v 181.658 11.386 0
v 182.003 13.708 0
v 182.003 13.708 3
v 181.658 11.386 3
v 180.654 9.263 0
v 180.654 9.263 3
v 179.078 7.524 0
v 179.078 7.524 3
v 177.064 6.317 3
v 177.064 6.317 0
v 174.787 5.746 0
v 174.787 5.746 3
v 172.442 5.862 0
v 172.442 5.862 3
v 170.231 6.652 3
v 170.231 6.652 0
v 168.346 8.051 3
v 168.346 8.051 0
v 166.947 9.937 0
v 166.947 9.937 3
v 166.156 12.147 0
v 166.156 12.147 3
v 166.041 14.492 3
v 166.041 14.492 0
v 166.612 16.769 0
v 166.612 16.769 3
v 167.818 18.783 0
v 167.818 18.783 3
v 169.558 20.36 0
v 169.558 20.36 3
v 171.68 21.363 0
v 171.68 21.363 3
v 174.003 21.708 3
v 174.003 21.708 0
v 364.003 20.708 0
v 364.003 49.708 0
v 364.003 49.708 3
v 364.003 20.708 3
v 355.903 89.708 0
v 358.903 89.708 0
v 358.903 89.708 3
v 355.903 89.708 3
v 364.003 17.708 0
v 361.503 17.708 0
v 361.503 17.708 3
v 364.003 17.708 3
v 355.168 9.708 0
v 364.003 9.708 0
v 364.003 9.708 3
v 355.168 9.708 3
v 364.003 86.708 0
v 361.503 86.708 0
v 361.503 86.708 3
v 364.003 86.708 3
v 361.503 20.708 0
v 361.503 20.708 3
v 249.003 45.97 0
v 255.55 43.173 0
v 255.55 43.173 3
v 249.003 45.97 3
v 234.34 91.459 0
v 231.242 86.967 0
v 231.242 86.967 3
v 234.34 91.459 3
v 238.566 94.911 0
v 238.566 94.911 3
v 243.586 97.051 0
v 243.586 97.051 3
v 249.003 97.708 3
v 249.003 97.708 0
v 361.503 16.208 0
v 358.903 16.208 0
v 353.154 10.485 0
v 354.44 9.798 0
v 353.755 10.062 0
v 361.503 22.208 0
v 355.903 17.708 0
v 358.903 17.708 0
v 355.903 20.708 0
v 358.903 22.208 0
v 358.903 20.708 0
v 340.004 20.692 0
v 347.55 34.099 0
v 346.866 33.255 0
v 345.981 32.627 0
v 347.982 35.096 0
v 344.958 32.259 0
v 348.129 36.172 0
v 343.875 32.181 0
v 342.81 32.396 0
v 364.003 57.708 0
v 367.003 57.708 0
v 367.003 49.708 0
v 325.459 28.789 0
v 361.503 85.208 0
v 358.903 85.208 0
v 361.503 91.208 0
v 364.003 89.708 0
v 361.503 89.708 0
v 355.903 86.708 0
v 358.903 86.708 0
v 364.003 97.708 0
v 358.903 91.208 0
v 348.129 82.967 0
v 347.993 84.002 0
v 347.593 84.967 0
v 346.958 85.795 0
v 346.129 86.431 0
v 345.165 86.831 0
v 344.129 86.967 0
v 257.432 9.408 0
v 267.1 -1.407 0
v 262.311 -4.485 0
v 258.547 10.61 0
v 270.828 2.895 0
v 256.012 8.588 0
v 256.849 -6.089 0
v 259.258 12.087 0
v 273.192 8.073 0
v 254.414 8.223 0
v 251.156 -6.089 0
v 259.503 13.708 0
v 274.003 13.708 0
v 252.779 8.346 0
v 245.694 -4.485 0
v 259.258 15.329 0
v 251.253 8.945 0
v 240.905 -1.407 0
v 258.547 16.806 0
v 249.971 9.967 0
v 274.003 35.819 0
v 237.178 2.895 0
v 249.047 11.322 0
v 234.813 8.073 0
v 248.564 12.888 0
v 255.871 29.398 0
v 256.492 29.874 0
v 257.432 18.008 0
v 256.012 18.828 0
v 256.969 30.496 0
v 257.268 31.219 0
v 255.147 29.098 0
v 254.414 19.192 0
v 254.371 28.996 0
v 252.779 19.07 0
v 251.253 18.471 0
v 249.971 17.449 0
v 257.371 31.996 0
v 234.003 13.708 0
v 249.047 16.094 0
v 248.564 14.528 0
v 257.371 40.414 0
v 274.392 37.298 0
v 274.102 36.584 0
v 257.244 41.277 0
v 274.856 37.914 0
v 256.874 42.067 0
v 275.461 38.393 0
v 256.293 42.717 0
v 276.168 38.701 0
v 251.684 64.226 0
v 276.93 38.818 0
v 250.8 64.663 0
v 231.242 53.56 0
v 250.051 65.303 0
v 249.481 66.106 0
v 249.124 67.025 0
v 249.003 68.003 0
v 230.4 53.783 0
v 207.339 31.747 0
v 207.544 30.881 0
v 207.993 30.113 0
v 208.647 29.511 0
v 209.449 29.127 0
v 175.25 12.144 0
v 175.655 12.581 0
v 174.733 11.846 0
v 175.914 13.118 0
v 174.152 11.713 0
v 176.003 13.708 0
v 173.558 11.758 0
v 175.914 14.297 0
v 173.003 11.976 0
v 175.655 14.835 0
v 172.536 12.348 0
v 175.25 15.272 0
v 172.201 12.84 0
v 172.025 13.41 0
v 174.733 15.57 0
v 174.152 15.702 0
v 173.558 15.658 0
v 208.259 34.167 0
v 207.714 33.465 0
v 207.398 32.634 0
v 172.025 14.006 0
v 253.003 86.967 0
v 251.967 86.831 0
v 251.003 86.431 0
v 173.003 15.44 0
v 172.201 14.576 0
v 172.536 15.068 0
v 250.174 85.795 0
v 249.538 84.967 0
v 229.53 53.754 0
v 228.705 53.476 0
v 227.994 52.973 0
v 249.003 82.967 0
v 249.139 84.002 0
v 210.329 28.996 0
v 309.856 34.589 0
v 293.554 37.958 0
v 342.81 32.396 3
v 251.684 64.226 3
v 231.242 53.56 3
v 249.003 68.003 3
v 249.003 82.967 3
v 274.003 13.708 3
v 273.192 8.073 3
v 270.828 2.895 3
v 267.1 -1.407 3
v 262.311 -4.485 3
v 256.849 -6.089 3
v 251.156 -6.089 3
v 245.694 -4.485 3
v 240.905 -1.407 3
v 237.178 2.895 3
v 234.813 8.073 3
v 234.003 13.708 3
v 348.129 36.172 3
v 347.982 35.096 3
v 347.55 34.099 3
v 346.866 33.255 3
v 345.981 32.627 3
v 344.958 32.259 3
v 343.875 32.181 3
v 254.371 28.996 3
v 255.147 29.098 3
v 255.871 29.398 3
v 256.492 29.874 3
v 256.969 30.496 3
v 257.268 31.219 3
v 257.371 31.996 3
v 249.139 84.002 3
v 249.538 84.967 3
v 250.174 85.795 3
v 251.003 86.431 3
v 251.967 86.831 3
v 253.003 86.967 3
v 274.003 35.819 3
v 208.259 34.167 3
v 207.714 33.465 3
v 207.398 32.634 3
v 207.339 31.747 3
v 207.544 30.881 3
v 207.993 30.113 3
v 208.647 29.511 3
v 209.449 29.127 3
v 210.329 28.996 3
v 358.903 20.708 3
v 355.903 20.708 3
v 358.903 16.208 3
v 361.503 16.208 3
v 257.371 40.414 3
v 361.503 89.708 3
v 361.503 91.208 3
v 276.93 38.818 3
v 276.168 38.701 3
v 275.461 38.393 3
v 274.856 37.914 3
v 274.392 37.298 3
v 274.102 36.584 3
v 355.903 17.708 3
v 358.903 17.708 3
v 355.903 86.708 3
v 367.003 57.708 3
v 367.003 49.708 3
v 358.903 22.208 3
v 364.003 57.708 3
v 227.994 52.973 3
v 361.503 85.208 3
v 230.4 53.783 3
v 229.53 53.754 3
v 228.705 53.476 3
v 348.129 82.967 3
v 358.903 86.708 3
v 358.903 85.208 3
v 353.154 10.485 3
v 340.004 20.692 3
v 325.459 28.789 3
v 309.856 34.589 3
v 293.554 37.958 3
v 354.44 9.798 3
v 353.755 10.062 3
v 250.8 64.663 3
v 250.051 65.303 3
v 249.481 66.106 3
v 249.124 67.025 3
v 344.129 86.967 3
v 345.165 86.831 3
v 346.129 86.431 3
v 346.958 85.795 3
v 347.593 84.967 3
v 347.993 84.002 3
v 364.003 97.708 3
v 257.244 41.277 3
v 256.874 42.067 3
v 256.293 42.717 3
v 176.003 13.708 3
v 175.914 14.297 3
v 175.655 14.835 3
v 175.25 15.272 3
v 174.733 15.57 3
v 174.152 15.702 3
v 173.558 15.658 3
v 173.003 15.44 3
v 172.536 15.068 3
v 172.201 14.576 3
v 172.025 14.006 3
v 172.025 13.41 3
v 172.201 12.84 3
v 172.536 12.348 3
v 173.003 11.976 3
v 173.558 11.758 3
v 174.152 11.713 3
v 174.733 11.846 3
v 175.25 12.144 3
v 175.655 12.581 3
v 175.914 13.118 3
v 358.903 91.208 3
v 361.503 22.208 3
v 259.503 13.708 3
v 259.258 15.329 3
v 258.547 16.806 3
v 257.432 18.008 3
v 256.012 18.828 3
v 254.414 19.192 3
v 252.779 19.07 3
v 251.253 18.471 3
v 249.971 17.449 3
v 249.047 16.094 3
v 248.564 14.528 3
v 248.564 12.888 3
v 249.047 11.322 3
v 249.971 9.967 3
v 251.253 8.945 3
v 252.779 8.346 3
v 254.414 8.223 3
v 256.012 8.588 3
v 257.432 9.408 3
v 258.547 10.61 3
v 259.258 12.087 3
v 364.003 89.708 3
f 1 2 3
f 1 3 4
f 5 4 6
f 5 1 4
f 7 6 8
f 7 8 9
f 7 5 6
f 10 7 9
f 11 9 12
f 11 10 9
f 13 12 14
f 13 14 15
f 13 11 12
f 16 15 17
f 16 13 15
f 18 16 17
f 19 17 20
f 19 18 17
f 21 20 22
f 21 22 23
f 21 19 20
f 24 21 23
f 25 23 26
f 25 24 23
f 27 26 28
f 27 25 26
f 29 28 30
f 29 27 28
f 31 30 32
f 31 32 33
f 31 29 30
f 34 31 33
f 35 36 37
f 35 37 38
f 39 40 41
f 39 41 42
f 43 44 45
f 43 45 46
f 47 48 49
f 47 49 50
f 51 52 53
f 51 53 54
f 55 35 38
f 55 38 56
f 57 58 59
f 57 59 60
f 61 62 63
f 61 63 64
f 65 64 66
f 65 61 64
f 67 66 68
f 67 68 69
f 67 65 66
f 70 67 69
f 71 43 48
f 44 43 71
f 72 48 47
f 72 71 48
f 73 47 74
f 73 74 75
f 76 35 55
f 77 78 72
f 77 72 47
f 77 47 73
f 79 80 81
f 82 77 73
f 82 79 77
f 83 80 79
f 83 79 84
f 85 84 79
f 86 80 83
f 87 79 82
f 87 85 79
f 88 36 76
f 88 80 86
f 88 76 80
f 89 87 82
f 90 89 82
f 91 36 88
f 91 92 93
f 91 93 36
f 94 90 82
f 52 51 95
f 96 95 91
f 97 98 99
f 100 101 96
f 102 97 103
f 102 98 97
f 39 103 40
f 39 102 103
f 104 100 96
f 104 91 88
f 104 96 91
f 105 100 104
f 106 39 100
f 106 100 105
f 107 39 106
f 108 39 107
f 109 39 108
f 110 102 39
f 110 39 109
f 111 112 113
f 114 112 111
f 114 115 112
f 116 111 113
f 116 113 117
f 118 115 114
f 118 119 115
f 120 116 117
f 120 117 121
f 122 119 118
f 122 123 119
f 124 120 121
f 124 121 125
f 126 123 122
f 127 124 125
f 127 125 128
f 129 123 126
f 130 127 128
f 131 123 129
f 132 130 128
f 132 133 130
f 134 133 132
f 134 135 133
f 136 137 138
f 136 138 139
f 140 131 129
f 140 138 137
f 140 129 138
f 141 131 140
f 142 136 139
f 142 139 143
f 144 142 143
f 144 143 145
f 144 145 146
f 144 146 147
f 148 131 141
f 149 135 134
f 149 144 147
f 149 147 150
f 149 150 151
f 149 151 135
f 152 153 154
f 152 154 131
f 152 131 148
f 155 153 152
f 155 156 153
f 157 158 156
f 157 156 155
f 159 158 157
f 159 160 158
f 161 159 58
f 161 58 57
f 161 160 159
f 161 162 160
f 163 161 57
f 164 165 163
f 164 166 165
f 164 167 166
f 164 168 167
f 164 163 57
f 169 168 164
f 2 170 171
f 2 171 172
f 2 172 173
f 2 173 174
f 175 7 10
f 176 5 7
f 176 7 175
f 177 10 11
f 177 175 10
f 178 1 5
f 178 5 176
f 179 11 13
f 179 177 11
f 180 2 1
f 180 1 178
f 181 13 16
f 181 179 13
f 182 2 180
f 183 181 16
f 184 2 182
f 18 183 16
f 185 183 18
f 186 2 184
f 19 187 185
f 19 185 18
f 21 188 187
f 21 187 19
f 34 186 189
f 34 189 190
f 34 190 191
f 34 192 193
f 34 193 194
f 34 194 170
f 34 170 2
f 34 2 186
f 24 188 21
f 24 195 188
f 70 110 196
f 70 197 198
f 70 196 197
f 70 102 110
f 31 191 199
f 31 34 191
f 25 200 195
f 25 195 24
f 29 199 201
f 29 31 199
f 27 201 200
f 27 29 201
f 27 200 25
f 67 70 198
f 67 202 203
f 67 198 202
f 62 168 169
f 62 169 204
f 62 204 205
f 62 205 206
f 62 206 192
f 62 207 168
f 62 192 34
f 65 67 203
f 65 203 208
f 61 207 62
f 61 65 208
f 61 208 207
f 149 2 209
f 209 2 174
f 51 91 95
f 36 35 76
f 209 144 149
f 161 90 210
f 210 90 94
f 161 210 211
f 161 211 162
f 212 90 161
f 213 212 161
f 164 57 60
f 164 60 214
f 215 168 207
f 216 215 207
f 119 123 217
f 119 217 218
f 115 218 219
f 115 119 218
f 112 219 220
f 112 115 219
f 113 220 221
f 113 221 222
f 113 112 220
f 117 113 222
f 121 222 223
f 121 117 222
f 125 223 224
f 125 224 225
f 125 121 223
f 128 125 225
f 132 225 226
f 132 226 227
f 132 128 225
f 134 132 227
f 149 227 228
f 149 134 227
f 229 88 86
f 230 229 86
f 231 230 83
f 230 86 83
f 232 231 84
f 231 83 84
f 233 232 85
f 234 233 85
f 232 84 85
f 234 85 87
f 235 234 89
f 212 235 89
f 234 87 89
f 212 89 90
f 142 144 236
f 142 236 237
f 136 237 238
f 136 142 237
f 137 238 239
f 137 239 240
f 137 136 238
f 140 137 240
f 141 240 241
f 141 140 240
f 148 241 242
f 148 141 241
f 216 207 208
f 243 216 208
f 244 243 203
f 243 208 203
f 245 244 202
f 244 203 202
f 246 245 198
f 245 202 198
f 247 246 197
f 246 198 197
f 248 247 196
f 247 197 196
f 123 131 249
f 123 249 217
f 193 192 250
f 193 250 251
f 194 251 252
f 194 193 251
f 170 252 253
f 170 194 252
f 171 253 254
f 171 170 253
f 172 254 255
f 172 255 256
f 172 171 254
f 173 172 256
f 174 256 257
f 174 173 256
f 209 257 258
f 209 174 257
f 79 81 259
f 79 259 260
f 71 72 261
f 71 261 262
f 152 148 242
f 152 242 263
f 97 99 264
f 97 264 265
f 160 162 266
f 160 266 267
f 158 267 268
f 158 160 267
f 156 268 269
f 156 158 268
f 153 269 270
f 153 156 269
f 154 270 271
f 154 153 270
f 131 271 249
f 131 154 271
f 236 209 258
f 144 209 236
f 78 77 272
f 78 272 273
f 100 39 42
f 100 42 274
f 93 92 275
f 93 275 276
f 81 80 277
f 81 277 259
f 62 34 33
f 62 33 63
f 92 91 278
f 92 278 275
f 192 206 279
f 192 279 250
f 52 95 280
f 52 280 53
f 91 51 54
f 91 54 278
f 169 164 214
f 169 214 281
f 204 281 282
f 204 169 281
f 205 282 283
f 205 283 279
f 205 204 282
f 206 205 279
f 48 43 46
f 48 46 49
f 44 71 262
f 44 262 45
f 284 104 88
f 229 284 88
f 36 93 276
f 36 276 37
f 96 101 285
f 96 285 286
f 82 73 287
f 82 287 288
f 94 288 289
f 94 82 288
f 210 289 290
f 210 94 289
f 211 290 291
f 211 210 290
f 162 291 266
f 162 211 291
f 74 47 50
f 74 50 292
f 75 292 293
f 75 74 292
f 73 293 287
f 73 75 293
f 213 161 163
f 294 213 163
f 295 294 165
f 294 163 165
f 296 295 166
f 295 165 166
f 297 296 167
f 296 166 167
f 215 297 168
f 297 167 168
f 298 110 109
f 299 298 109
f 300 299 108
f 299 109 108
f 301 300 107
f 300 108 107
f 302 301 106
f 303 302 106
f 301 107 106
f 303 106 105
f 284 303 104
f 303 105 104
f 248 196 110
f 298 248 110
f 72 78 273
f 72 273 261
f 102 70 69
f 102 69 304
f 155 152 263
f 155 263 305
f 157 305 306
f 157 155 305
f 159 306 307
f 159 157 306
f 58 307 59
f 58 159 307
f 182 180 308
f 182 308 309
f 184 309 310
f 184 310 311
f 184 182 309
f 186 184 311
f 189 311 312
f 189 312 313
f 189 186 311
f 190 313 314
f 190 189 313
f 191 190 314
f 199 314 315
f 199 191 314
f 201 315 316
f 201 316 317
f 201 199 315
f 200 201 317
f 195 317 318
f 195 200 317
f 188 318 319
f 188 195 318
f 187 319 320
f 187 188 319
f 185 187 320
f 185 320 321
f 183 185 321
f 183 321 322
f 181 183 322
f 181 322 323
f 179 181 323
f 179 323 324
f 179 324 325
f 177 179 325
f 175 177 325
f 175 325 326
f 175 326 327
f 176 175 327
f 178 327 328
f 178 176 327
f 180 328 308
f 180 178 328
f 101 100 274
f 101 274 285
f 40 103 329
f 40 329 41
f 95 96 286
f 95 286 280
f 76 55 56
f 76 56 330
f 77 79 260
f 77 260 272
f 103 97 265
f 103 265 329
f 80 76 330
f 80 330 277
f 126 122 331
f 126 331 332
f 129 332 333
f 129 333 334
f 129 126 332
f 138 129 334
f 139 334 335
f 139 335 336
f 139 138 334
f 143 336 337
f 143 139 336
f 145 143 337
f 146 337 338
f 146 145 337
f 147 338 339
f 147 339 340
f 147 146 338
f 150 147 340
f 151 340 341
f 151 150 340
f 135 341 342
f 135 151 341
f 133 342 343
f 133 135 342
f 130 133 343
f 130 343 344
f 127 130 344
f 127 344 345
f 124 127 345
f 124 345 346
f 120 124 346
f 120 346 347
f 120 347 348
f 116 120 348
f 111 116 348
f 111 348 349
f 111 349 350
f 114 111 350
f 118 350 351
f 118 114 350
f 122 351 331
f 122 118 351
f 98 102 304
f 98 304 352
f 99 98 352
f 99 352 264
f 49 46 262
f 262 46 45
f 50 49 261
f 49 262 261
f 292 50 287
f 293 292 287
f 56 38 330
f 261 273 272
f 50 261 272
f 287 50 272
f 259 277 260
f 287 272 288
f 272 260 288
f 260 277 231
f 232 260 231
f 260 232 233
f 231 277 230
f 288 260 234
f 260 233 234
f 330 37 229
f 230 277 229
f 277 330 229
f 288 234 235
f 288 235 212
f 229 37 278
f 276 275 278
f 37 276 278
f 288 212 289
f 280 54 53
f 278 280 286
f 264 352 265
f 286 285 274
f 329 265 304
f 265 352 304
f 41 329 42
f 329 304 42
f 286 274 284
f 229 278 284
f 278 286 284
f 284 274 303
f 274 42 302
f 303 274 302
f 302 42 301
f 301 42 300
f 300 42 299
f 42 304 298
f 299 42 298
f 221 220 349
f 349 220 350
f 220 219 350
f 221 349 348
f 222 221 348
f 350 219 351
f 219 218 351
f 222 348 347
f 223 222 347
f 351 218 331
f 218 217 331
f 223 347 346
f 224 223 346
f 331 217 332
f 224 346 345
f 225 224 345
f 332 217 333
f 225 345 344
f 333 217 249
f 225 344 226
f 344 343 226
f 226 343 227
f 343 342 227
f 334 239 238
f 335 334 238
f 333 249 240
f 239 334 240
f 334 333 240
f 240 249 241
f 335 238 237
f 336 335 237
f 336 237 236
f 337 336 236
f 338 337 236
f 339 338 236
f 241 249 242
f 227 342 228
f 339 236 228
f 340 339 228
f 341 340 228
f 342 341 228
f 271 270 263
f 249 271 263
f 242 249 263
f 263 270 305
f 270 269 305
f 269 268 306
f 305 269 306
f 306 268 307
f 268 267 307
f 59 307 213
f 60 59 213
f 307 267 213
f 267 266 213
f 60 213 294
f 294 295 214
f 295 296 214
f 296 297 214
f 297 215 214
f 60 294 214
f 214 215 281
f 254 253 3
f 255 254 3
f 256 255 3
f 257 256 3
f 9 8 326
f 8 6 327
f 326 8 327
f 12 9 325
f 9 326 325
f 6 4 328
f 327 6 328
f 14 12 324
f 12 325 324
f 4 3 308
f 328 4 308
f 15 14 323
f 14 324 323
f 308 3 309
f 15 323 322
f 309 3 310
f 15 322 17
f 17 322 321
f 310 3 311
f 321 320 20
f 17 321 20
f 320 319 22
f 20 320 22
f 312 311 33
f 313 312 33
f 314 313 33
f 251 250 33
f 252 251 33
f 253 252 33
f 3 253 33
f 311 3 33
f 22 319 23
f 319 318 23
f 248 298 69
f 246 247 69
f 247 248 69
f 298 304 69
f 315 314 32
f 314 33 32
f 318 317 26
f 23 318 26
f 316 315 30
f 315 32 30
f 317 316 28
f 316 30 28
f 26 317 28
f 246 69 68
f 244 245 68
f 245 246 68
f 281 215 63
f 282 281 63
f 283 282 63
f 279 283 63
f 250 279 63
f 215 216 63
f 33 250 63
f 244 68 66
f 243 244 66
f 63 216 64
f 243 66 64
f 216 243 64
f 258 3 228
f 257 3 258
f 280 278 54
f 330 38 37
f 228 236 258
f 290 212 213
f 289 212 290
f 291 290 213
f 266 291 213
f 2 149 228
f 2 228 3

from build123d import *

# Parameters (mm, degrees)
SKETCH_1_R      = 2
SKETCH_1_R_2    = 5.5
EXTRUDE_1_DEPTH = 3


with BuildPart() as part:
    # 草图1 → 凸台-拉伸1 (new body)
    with BuildSketch(Plane.XY):
        with BuildLine():
            Line((234.002581869, 13.707860978), (182.002581869, 13.707860978))
            ThreePointArc((182.002581869, 13.707860978), (168.34572762, 8.051006728), (174.002581869, 21.707860978))
            Line((174.002581869, 21.707860978), (231.242343182, 86.967009497))
            ThreePointArc((231.242343182, 86.967009497), (238.565892024, 94.911259453), (249.002581869, 97.707860978))
            Line((249.002581869, 97.707860978), (354.002581869, 97.707860978))
            Line((354.002581869, 97.707860978), (364.002581869, 97.707860978))
            Line((364.002581869, 97.707860978), (364.002581869, 89.707860978))
            Line((364.002581869, 89.707860978), (361.502581869, 89.707860978))
            Line((361.502581869, 89.707860978), (361.502581869, 91.207860978))
            Line((361.502581869, 91.207860978), (358.902581869, 91.207860978))
            Line((358.902581869, 91.207860978), (358.902581869, 89.707860978))
            Line((358.902581869, 89.707860978), (355.902581869, 89.707860978))
            Line((355.902581869, 89.707860978), (355.902581869, 86.707860978))
            Line((355.902581869, 86.707860978), (358.902581869, 86.707860978))
            Line((358.902581869, 86.707860978), (358.902581869, 85.207860978))
            Line((358.902581869, 85.207860978), (361.502581869, 85.207860978))
            Line((361.502581869, 85.207860978), (361.502581869, 86.707860978))
            Line((361.502581869, 86.707860978), (364.002581869, 86.707860978))
            Line((364.002581869, 86.707860978), (364.002581869, 57.707860978))
            Line((364.002581869, 57.707860978), (367.002581869, 57.707860978))
            Line((367.002581869, 57.707860978), (367.002581869, 49.707860978))
            Line((367.002581869, 49.707860978), (364.002581869, 49.707860978))
            Line((364.002581869, 49.707860978), (364.002581869, 20.707860978))
            Line((364.002581869, 20.707860978), (361.502581869, 20.707860978))
            Line((361.502581869, 20.707860978), (361.502581869, 22.207860978))
            Line((361.502581869, 22.207860978), (358.902581869, 22.207860978))
            Line((358.902581869, 22.207860978), (358.902581869, 20.707860978))
            Line((358.902581869, 20.707860978), (355.902581869, 20.707860978))
            Line((355.902581869, 20.707860978), (355.902581869, 17.707860978))
            Line((355.902581869, 17.707860978), (358.902581869, 17.707860978))
            Line((358.902581869, 17.707860978), (358.902581869, 16.207860978))
            Line((358.902581869, 16.207860978), (361.502581869, 16.207860978))
            Line((361.502581869, 16.207860978), (361.502581869, 17.707860978))
            Line((361.502581869, 17.707860978), (364.002581869, 17.707860978))
            Line((364.002581869, 17.707860978), (364.002581869, 9.707860978))
            Line((364.002581869, 9.707860978), (355.16842929, 9.707860978))
            ThreePointArc((355.16842929, 9.707860978), (354.089046944, 9.908765811), (353.154233351, 10.484571811))
            ThreePointArc((353.154233351, 10.484571811), (317.768023154, 31.985283132), (276.929619495, 38.818236083))
            ThreePointArc((276.929619495, 38.818236083), (274.855620398, 37.914488932), (274.002581869, 35.819123465))
            Line((274.002581869, 35.819123465), (274.002581869, 13.707860978))
            ThreePointArc((274.002581869, 13.707860978), (254.002581869, -6.292139022), (234.002581869, 13.707860978))
        make_face()
        with Locations((174.002581869, 13.707860978)):
            Circle(SKETCH_1_R, mode=Mode.SUBTRACT)
        with Locations((254.002581869, 13.707860978)):
            Circle(SKETCH_1_R_2, mode=Mode.SUBTRACT)
        with BuildLine():
            Line((253.002581869, 86.967009497), (344.129272471, 86.967009497))
            ThreePointArc((344.129272471, 86.967009497), (346.957699596, 85.795436622), (348.129272471, 82.967009497))
            Line((348.129272471, 82.967009497), (348.129272471, 36.172406577))
            ThreePointArc((348.129272471, 36.172406577), (346.444858552, 32.910802508), (342.810241921, 32.396144085))
            Line((342.810241921, 32.396144085), (251.683551319, 64.226264226))
            ThreePointArc((251.683551319, 64.226264226), (249.740977801, 65.686940637), (249.002581869, 68.002526718))
            Line((249.002581869, 68.002526718), (249.002581869, 82.967009497))
            ThreePointArc((249.002581869, 82.967009497), (250.174154745, 85.795436622), (253.002581869, 86.967009497))
        make_face(mode=Mode.SUBTRACT)
        with BuildLine():
            Line((255.549578652, 43.172566622), (249.002581869, 45.970414811))
            Line((249.002581869, 45.970414811), (231.242343182, 53.560223281))
            ThreePointArc((231.242343182, 53.560223281), (229.530107584, 53.753780798), (227.993824006, 52.973365511))
            Line((227.993824006, 52.973365511), (208.259363433, 34.167429409))
            ThreePointArc((208.259363433, 34.167429409), (207.543711742, 30.881045102), (210.328975867, 28.99563191))
            Line((210.328975867, 28.99563191), (254.37067191, 28.99563191))
            ThreePointArc((254.37067191, 28.99563191), (256.491992253, 29.874311567), (257.37067191, 31.99563191))
            Line((257.37067191, 31.99563191), (257.37067191, 40.413911353))
            ThreePointArc((257.37067191, 40.413911353), (256.87434124, 42.066678695), (255.549578652, 43.172566622))
        make_face(mode=Mode.SUBTRACT)
    extrude(amount=EXTRUDE_1_DEPTH)


solid = part.part
